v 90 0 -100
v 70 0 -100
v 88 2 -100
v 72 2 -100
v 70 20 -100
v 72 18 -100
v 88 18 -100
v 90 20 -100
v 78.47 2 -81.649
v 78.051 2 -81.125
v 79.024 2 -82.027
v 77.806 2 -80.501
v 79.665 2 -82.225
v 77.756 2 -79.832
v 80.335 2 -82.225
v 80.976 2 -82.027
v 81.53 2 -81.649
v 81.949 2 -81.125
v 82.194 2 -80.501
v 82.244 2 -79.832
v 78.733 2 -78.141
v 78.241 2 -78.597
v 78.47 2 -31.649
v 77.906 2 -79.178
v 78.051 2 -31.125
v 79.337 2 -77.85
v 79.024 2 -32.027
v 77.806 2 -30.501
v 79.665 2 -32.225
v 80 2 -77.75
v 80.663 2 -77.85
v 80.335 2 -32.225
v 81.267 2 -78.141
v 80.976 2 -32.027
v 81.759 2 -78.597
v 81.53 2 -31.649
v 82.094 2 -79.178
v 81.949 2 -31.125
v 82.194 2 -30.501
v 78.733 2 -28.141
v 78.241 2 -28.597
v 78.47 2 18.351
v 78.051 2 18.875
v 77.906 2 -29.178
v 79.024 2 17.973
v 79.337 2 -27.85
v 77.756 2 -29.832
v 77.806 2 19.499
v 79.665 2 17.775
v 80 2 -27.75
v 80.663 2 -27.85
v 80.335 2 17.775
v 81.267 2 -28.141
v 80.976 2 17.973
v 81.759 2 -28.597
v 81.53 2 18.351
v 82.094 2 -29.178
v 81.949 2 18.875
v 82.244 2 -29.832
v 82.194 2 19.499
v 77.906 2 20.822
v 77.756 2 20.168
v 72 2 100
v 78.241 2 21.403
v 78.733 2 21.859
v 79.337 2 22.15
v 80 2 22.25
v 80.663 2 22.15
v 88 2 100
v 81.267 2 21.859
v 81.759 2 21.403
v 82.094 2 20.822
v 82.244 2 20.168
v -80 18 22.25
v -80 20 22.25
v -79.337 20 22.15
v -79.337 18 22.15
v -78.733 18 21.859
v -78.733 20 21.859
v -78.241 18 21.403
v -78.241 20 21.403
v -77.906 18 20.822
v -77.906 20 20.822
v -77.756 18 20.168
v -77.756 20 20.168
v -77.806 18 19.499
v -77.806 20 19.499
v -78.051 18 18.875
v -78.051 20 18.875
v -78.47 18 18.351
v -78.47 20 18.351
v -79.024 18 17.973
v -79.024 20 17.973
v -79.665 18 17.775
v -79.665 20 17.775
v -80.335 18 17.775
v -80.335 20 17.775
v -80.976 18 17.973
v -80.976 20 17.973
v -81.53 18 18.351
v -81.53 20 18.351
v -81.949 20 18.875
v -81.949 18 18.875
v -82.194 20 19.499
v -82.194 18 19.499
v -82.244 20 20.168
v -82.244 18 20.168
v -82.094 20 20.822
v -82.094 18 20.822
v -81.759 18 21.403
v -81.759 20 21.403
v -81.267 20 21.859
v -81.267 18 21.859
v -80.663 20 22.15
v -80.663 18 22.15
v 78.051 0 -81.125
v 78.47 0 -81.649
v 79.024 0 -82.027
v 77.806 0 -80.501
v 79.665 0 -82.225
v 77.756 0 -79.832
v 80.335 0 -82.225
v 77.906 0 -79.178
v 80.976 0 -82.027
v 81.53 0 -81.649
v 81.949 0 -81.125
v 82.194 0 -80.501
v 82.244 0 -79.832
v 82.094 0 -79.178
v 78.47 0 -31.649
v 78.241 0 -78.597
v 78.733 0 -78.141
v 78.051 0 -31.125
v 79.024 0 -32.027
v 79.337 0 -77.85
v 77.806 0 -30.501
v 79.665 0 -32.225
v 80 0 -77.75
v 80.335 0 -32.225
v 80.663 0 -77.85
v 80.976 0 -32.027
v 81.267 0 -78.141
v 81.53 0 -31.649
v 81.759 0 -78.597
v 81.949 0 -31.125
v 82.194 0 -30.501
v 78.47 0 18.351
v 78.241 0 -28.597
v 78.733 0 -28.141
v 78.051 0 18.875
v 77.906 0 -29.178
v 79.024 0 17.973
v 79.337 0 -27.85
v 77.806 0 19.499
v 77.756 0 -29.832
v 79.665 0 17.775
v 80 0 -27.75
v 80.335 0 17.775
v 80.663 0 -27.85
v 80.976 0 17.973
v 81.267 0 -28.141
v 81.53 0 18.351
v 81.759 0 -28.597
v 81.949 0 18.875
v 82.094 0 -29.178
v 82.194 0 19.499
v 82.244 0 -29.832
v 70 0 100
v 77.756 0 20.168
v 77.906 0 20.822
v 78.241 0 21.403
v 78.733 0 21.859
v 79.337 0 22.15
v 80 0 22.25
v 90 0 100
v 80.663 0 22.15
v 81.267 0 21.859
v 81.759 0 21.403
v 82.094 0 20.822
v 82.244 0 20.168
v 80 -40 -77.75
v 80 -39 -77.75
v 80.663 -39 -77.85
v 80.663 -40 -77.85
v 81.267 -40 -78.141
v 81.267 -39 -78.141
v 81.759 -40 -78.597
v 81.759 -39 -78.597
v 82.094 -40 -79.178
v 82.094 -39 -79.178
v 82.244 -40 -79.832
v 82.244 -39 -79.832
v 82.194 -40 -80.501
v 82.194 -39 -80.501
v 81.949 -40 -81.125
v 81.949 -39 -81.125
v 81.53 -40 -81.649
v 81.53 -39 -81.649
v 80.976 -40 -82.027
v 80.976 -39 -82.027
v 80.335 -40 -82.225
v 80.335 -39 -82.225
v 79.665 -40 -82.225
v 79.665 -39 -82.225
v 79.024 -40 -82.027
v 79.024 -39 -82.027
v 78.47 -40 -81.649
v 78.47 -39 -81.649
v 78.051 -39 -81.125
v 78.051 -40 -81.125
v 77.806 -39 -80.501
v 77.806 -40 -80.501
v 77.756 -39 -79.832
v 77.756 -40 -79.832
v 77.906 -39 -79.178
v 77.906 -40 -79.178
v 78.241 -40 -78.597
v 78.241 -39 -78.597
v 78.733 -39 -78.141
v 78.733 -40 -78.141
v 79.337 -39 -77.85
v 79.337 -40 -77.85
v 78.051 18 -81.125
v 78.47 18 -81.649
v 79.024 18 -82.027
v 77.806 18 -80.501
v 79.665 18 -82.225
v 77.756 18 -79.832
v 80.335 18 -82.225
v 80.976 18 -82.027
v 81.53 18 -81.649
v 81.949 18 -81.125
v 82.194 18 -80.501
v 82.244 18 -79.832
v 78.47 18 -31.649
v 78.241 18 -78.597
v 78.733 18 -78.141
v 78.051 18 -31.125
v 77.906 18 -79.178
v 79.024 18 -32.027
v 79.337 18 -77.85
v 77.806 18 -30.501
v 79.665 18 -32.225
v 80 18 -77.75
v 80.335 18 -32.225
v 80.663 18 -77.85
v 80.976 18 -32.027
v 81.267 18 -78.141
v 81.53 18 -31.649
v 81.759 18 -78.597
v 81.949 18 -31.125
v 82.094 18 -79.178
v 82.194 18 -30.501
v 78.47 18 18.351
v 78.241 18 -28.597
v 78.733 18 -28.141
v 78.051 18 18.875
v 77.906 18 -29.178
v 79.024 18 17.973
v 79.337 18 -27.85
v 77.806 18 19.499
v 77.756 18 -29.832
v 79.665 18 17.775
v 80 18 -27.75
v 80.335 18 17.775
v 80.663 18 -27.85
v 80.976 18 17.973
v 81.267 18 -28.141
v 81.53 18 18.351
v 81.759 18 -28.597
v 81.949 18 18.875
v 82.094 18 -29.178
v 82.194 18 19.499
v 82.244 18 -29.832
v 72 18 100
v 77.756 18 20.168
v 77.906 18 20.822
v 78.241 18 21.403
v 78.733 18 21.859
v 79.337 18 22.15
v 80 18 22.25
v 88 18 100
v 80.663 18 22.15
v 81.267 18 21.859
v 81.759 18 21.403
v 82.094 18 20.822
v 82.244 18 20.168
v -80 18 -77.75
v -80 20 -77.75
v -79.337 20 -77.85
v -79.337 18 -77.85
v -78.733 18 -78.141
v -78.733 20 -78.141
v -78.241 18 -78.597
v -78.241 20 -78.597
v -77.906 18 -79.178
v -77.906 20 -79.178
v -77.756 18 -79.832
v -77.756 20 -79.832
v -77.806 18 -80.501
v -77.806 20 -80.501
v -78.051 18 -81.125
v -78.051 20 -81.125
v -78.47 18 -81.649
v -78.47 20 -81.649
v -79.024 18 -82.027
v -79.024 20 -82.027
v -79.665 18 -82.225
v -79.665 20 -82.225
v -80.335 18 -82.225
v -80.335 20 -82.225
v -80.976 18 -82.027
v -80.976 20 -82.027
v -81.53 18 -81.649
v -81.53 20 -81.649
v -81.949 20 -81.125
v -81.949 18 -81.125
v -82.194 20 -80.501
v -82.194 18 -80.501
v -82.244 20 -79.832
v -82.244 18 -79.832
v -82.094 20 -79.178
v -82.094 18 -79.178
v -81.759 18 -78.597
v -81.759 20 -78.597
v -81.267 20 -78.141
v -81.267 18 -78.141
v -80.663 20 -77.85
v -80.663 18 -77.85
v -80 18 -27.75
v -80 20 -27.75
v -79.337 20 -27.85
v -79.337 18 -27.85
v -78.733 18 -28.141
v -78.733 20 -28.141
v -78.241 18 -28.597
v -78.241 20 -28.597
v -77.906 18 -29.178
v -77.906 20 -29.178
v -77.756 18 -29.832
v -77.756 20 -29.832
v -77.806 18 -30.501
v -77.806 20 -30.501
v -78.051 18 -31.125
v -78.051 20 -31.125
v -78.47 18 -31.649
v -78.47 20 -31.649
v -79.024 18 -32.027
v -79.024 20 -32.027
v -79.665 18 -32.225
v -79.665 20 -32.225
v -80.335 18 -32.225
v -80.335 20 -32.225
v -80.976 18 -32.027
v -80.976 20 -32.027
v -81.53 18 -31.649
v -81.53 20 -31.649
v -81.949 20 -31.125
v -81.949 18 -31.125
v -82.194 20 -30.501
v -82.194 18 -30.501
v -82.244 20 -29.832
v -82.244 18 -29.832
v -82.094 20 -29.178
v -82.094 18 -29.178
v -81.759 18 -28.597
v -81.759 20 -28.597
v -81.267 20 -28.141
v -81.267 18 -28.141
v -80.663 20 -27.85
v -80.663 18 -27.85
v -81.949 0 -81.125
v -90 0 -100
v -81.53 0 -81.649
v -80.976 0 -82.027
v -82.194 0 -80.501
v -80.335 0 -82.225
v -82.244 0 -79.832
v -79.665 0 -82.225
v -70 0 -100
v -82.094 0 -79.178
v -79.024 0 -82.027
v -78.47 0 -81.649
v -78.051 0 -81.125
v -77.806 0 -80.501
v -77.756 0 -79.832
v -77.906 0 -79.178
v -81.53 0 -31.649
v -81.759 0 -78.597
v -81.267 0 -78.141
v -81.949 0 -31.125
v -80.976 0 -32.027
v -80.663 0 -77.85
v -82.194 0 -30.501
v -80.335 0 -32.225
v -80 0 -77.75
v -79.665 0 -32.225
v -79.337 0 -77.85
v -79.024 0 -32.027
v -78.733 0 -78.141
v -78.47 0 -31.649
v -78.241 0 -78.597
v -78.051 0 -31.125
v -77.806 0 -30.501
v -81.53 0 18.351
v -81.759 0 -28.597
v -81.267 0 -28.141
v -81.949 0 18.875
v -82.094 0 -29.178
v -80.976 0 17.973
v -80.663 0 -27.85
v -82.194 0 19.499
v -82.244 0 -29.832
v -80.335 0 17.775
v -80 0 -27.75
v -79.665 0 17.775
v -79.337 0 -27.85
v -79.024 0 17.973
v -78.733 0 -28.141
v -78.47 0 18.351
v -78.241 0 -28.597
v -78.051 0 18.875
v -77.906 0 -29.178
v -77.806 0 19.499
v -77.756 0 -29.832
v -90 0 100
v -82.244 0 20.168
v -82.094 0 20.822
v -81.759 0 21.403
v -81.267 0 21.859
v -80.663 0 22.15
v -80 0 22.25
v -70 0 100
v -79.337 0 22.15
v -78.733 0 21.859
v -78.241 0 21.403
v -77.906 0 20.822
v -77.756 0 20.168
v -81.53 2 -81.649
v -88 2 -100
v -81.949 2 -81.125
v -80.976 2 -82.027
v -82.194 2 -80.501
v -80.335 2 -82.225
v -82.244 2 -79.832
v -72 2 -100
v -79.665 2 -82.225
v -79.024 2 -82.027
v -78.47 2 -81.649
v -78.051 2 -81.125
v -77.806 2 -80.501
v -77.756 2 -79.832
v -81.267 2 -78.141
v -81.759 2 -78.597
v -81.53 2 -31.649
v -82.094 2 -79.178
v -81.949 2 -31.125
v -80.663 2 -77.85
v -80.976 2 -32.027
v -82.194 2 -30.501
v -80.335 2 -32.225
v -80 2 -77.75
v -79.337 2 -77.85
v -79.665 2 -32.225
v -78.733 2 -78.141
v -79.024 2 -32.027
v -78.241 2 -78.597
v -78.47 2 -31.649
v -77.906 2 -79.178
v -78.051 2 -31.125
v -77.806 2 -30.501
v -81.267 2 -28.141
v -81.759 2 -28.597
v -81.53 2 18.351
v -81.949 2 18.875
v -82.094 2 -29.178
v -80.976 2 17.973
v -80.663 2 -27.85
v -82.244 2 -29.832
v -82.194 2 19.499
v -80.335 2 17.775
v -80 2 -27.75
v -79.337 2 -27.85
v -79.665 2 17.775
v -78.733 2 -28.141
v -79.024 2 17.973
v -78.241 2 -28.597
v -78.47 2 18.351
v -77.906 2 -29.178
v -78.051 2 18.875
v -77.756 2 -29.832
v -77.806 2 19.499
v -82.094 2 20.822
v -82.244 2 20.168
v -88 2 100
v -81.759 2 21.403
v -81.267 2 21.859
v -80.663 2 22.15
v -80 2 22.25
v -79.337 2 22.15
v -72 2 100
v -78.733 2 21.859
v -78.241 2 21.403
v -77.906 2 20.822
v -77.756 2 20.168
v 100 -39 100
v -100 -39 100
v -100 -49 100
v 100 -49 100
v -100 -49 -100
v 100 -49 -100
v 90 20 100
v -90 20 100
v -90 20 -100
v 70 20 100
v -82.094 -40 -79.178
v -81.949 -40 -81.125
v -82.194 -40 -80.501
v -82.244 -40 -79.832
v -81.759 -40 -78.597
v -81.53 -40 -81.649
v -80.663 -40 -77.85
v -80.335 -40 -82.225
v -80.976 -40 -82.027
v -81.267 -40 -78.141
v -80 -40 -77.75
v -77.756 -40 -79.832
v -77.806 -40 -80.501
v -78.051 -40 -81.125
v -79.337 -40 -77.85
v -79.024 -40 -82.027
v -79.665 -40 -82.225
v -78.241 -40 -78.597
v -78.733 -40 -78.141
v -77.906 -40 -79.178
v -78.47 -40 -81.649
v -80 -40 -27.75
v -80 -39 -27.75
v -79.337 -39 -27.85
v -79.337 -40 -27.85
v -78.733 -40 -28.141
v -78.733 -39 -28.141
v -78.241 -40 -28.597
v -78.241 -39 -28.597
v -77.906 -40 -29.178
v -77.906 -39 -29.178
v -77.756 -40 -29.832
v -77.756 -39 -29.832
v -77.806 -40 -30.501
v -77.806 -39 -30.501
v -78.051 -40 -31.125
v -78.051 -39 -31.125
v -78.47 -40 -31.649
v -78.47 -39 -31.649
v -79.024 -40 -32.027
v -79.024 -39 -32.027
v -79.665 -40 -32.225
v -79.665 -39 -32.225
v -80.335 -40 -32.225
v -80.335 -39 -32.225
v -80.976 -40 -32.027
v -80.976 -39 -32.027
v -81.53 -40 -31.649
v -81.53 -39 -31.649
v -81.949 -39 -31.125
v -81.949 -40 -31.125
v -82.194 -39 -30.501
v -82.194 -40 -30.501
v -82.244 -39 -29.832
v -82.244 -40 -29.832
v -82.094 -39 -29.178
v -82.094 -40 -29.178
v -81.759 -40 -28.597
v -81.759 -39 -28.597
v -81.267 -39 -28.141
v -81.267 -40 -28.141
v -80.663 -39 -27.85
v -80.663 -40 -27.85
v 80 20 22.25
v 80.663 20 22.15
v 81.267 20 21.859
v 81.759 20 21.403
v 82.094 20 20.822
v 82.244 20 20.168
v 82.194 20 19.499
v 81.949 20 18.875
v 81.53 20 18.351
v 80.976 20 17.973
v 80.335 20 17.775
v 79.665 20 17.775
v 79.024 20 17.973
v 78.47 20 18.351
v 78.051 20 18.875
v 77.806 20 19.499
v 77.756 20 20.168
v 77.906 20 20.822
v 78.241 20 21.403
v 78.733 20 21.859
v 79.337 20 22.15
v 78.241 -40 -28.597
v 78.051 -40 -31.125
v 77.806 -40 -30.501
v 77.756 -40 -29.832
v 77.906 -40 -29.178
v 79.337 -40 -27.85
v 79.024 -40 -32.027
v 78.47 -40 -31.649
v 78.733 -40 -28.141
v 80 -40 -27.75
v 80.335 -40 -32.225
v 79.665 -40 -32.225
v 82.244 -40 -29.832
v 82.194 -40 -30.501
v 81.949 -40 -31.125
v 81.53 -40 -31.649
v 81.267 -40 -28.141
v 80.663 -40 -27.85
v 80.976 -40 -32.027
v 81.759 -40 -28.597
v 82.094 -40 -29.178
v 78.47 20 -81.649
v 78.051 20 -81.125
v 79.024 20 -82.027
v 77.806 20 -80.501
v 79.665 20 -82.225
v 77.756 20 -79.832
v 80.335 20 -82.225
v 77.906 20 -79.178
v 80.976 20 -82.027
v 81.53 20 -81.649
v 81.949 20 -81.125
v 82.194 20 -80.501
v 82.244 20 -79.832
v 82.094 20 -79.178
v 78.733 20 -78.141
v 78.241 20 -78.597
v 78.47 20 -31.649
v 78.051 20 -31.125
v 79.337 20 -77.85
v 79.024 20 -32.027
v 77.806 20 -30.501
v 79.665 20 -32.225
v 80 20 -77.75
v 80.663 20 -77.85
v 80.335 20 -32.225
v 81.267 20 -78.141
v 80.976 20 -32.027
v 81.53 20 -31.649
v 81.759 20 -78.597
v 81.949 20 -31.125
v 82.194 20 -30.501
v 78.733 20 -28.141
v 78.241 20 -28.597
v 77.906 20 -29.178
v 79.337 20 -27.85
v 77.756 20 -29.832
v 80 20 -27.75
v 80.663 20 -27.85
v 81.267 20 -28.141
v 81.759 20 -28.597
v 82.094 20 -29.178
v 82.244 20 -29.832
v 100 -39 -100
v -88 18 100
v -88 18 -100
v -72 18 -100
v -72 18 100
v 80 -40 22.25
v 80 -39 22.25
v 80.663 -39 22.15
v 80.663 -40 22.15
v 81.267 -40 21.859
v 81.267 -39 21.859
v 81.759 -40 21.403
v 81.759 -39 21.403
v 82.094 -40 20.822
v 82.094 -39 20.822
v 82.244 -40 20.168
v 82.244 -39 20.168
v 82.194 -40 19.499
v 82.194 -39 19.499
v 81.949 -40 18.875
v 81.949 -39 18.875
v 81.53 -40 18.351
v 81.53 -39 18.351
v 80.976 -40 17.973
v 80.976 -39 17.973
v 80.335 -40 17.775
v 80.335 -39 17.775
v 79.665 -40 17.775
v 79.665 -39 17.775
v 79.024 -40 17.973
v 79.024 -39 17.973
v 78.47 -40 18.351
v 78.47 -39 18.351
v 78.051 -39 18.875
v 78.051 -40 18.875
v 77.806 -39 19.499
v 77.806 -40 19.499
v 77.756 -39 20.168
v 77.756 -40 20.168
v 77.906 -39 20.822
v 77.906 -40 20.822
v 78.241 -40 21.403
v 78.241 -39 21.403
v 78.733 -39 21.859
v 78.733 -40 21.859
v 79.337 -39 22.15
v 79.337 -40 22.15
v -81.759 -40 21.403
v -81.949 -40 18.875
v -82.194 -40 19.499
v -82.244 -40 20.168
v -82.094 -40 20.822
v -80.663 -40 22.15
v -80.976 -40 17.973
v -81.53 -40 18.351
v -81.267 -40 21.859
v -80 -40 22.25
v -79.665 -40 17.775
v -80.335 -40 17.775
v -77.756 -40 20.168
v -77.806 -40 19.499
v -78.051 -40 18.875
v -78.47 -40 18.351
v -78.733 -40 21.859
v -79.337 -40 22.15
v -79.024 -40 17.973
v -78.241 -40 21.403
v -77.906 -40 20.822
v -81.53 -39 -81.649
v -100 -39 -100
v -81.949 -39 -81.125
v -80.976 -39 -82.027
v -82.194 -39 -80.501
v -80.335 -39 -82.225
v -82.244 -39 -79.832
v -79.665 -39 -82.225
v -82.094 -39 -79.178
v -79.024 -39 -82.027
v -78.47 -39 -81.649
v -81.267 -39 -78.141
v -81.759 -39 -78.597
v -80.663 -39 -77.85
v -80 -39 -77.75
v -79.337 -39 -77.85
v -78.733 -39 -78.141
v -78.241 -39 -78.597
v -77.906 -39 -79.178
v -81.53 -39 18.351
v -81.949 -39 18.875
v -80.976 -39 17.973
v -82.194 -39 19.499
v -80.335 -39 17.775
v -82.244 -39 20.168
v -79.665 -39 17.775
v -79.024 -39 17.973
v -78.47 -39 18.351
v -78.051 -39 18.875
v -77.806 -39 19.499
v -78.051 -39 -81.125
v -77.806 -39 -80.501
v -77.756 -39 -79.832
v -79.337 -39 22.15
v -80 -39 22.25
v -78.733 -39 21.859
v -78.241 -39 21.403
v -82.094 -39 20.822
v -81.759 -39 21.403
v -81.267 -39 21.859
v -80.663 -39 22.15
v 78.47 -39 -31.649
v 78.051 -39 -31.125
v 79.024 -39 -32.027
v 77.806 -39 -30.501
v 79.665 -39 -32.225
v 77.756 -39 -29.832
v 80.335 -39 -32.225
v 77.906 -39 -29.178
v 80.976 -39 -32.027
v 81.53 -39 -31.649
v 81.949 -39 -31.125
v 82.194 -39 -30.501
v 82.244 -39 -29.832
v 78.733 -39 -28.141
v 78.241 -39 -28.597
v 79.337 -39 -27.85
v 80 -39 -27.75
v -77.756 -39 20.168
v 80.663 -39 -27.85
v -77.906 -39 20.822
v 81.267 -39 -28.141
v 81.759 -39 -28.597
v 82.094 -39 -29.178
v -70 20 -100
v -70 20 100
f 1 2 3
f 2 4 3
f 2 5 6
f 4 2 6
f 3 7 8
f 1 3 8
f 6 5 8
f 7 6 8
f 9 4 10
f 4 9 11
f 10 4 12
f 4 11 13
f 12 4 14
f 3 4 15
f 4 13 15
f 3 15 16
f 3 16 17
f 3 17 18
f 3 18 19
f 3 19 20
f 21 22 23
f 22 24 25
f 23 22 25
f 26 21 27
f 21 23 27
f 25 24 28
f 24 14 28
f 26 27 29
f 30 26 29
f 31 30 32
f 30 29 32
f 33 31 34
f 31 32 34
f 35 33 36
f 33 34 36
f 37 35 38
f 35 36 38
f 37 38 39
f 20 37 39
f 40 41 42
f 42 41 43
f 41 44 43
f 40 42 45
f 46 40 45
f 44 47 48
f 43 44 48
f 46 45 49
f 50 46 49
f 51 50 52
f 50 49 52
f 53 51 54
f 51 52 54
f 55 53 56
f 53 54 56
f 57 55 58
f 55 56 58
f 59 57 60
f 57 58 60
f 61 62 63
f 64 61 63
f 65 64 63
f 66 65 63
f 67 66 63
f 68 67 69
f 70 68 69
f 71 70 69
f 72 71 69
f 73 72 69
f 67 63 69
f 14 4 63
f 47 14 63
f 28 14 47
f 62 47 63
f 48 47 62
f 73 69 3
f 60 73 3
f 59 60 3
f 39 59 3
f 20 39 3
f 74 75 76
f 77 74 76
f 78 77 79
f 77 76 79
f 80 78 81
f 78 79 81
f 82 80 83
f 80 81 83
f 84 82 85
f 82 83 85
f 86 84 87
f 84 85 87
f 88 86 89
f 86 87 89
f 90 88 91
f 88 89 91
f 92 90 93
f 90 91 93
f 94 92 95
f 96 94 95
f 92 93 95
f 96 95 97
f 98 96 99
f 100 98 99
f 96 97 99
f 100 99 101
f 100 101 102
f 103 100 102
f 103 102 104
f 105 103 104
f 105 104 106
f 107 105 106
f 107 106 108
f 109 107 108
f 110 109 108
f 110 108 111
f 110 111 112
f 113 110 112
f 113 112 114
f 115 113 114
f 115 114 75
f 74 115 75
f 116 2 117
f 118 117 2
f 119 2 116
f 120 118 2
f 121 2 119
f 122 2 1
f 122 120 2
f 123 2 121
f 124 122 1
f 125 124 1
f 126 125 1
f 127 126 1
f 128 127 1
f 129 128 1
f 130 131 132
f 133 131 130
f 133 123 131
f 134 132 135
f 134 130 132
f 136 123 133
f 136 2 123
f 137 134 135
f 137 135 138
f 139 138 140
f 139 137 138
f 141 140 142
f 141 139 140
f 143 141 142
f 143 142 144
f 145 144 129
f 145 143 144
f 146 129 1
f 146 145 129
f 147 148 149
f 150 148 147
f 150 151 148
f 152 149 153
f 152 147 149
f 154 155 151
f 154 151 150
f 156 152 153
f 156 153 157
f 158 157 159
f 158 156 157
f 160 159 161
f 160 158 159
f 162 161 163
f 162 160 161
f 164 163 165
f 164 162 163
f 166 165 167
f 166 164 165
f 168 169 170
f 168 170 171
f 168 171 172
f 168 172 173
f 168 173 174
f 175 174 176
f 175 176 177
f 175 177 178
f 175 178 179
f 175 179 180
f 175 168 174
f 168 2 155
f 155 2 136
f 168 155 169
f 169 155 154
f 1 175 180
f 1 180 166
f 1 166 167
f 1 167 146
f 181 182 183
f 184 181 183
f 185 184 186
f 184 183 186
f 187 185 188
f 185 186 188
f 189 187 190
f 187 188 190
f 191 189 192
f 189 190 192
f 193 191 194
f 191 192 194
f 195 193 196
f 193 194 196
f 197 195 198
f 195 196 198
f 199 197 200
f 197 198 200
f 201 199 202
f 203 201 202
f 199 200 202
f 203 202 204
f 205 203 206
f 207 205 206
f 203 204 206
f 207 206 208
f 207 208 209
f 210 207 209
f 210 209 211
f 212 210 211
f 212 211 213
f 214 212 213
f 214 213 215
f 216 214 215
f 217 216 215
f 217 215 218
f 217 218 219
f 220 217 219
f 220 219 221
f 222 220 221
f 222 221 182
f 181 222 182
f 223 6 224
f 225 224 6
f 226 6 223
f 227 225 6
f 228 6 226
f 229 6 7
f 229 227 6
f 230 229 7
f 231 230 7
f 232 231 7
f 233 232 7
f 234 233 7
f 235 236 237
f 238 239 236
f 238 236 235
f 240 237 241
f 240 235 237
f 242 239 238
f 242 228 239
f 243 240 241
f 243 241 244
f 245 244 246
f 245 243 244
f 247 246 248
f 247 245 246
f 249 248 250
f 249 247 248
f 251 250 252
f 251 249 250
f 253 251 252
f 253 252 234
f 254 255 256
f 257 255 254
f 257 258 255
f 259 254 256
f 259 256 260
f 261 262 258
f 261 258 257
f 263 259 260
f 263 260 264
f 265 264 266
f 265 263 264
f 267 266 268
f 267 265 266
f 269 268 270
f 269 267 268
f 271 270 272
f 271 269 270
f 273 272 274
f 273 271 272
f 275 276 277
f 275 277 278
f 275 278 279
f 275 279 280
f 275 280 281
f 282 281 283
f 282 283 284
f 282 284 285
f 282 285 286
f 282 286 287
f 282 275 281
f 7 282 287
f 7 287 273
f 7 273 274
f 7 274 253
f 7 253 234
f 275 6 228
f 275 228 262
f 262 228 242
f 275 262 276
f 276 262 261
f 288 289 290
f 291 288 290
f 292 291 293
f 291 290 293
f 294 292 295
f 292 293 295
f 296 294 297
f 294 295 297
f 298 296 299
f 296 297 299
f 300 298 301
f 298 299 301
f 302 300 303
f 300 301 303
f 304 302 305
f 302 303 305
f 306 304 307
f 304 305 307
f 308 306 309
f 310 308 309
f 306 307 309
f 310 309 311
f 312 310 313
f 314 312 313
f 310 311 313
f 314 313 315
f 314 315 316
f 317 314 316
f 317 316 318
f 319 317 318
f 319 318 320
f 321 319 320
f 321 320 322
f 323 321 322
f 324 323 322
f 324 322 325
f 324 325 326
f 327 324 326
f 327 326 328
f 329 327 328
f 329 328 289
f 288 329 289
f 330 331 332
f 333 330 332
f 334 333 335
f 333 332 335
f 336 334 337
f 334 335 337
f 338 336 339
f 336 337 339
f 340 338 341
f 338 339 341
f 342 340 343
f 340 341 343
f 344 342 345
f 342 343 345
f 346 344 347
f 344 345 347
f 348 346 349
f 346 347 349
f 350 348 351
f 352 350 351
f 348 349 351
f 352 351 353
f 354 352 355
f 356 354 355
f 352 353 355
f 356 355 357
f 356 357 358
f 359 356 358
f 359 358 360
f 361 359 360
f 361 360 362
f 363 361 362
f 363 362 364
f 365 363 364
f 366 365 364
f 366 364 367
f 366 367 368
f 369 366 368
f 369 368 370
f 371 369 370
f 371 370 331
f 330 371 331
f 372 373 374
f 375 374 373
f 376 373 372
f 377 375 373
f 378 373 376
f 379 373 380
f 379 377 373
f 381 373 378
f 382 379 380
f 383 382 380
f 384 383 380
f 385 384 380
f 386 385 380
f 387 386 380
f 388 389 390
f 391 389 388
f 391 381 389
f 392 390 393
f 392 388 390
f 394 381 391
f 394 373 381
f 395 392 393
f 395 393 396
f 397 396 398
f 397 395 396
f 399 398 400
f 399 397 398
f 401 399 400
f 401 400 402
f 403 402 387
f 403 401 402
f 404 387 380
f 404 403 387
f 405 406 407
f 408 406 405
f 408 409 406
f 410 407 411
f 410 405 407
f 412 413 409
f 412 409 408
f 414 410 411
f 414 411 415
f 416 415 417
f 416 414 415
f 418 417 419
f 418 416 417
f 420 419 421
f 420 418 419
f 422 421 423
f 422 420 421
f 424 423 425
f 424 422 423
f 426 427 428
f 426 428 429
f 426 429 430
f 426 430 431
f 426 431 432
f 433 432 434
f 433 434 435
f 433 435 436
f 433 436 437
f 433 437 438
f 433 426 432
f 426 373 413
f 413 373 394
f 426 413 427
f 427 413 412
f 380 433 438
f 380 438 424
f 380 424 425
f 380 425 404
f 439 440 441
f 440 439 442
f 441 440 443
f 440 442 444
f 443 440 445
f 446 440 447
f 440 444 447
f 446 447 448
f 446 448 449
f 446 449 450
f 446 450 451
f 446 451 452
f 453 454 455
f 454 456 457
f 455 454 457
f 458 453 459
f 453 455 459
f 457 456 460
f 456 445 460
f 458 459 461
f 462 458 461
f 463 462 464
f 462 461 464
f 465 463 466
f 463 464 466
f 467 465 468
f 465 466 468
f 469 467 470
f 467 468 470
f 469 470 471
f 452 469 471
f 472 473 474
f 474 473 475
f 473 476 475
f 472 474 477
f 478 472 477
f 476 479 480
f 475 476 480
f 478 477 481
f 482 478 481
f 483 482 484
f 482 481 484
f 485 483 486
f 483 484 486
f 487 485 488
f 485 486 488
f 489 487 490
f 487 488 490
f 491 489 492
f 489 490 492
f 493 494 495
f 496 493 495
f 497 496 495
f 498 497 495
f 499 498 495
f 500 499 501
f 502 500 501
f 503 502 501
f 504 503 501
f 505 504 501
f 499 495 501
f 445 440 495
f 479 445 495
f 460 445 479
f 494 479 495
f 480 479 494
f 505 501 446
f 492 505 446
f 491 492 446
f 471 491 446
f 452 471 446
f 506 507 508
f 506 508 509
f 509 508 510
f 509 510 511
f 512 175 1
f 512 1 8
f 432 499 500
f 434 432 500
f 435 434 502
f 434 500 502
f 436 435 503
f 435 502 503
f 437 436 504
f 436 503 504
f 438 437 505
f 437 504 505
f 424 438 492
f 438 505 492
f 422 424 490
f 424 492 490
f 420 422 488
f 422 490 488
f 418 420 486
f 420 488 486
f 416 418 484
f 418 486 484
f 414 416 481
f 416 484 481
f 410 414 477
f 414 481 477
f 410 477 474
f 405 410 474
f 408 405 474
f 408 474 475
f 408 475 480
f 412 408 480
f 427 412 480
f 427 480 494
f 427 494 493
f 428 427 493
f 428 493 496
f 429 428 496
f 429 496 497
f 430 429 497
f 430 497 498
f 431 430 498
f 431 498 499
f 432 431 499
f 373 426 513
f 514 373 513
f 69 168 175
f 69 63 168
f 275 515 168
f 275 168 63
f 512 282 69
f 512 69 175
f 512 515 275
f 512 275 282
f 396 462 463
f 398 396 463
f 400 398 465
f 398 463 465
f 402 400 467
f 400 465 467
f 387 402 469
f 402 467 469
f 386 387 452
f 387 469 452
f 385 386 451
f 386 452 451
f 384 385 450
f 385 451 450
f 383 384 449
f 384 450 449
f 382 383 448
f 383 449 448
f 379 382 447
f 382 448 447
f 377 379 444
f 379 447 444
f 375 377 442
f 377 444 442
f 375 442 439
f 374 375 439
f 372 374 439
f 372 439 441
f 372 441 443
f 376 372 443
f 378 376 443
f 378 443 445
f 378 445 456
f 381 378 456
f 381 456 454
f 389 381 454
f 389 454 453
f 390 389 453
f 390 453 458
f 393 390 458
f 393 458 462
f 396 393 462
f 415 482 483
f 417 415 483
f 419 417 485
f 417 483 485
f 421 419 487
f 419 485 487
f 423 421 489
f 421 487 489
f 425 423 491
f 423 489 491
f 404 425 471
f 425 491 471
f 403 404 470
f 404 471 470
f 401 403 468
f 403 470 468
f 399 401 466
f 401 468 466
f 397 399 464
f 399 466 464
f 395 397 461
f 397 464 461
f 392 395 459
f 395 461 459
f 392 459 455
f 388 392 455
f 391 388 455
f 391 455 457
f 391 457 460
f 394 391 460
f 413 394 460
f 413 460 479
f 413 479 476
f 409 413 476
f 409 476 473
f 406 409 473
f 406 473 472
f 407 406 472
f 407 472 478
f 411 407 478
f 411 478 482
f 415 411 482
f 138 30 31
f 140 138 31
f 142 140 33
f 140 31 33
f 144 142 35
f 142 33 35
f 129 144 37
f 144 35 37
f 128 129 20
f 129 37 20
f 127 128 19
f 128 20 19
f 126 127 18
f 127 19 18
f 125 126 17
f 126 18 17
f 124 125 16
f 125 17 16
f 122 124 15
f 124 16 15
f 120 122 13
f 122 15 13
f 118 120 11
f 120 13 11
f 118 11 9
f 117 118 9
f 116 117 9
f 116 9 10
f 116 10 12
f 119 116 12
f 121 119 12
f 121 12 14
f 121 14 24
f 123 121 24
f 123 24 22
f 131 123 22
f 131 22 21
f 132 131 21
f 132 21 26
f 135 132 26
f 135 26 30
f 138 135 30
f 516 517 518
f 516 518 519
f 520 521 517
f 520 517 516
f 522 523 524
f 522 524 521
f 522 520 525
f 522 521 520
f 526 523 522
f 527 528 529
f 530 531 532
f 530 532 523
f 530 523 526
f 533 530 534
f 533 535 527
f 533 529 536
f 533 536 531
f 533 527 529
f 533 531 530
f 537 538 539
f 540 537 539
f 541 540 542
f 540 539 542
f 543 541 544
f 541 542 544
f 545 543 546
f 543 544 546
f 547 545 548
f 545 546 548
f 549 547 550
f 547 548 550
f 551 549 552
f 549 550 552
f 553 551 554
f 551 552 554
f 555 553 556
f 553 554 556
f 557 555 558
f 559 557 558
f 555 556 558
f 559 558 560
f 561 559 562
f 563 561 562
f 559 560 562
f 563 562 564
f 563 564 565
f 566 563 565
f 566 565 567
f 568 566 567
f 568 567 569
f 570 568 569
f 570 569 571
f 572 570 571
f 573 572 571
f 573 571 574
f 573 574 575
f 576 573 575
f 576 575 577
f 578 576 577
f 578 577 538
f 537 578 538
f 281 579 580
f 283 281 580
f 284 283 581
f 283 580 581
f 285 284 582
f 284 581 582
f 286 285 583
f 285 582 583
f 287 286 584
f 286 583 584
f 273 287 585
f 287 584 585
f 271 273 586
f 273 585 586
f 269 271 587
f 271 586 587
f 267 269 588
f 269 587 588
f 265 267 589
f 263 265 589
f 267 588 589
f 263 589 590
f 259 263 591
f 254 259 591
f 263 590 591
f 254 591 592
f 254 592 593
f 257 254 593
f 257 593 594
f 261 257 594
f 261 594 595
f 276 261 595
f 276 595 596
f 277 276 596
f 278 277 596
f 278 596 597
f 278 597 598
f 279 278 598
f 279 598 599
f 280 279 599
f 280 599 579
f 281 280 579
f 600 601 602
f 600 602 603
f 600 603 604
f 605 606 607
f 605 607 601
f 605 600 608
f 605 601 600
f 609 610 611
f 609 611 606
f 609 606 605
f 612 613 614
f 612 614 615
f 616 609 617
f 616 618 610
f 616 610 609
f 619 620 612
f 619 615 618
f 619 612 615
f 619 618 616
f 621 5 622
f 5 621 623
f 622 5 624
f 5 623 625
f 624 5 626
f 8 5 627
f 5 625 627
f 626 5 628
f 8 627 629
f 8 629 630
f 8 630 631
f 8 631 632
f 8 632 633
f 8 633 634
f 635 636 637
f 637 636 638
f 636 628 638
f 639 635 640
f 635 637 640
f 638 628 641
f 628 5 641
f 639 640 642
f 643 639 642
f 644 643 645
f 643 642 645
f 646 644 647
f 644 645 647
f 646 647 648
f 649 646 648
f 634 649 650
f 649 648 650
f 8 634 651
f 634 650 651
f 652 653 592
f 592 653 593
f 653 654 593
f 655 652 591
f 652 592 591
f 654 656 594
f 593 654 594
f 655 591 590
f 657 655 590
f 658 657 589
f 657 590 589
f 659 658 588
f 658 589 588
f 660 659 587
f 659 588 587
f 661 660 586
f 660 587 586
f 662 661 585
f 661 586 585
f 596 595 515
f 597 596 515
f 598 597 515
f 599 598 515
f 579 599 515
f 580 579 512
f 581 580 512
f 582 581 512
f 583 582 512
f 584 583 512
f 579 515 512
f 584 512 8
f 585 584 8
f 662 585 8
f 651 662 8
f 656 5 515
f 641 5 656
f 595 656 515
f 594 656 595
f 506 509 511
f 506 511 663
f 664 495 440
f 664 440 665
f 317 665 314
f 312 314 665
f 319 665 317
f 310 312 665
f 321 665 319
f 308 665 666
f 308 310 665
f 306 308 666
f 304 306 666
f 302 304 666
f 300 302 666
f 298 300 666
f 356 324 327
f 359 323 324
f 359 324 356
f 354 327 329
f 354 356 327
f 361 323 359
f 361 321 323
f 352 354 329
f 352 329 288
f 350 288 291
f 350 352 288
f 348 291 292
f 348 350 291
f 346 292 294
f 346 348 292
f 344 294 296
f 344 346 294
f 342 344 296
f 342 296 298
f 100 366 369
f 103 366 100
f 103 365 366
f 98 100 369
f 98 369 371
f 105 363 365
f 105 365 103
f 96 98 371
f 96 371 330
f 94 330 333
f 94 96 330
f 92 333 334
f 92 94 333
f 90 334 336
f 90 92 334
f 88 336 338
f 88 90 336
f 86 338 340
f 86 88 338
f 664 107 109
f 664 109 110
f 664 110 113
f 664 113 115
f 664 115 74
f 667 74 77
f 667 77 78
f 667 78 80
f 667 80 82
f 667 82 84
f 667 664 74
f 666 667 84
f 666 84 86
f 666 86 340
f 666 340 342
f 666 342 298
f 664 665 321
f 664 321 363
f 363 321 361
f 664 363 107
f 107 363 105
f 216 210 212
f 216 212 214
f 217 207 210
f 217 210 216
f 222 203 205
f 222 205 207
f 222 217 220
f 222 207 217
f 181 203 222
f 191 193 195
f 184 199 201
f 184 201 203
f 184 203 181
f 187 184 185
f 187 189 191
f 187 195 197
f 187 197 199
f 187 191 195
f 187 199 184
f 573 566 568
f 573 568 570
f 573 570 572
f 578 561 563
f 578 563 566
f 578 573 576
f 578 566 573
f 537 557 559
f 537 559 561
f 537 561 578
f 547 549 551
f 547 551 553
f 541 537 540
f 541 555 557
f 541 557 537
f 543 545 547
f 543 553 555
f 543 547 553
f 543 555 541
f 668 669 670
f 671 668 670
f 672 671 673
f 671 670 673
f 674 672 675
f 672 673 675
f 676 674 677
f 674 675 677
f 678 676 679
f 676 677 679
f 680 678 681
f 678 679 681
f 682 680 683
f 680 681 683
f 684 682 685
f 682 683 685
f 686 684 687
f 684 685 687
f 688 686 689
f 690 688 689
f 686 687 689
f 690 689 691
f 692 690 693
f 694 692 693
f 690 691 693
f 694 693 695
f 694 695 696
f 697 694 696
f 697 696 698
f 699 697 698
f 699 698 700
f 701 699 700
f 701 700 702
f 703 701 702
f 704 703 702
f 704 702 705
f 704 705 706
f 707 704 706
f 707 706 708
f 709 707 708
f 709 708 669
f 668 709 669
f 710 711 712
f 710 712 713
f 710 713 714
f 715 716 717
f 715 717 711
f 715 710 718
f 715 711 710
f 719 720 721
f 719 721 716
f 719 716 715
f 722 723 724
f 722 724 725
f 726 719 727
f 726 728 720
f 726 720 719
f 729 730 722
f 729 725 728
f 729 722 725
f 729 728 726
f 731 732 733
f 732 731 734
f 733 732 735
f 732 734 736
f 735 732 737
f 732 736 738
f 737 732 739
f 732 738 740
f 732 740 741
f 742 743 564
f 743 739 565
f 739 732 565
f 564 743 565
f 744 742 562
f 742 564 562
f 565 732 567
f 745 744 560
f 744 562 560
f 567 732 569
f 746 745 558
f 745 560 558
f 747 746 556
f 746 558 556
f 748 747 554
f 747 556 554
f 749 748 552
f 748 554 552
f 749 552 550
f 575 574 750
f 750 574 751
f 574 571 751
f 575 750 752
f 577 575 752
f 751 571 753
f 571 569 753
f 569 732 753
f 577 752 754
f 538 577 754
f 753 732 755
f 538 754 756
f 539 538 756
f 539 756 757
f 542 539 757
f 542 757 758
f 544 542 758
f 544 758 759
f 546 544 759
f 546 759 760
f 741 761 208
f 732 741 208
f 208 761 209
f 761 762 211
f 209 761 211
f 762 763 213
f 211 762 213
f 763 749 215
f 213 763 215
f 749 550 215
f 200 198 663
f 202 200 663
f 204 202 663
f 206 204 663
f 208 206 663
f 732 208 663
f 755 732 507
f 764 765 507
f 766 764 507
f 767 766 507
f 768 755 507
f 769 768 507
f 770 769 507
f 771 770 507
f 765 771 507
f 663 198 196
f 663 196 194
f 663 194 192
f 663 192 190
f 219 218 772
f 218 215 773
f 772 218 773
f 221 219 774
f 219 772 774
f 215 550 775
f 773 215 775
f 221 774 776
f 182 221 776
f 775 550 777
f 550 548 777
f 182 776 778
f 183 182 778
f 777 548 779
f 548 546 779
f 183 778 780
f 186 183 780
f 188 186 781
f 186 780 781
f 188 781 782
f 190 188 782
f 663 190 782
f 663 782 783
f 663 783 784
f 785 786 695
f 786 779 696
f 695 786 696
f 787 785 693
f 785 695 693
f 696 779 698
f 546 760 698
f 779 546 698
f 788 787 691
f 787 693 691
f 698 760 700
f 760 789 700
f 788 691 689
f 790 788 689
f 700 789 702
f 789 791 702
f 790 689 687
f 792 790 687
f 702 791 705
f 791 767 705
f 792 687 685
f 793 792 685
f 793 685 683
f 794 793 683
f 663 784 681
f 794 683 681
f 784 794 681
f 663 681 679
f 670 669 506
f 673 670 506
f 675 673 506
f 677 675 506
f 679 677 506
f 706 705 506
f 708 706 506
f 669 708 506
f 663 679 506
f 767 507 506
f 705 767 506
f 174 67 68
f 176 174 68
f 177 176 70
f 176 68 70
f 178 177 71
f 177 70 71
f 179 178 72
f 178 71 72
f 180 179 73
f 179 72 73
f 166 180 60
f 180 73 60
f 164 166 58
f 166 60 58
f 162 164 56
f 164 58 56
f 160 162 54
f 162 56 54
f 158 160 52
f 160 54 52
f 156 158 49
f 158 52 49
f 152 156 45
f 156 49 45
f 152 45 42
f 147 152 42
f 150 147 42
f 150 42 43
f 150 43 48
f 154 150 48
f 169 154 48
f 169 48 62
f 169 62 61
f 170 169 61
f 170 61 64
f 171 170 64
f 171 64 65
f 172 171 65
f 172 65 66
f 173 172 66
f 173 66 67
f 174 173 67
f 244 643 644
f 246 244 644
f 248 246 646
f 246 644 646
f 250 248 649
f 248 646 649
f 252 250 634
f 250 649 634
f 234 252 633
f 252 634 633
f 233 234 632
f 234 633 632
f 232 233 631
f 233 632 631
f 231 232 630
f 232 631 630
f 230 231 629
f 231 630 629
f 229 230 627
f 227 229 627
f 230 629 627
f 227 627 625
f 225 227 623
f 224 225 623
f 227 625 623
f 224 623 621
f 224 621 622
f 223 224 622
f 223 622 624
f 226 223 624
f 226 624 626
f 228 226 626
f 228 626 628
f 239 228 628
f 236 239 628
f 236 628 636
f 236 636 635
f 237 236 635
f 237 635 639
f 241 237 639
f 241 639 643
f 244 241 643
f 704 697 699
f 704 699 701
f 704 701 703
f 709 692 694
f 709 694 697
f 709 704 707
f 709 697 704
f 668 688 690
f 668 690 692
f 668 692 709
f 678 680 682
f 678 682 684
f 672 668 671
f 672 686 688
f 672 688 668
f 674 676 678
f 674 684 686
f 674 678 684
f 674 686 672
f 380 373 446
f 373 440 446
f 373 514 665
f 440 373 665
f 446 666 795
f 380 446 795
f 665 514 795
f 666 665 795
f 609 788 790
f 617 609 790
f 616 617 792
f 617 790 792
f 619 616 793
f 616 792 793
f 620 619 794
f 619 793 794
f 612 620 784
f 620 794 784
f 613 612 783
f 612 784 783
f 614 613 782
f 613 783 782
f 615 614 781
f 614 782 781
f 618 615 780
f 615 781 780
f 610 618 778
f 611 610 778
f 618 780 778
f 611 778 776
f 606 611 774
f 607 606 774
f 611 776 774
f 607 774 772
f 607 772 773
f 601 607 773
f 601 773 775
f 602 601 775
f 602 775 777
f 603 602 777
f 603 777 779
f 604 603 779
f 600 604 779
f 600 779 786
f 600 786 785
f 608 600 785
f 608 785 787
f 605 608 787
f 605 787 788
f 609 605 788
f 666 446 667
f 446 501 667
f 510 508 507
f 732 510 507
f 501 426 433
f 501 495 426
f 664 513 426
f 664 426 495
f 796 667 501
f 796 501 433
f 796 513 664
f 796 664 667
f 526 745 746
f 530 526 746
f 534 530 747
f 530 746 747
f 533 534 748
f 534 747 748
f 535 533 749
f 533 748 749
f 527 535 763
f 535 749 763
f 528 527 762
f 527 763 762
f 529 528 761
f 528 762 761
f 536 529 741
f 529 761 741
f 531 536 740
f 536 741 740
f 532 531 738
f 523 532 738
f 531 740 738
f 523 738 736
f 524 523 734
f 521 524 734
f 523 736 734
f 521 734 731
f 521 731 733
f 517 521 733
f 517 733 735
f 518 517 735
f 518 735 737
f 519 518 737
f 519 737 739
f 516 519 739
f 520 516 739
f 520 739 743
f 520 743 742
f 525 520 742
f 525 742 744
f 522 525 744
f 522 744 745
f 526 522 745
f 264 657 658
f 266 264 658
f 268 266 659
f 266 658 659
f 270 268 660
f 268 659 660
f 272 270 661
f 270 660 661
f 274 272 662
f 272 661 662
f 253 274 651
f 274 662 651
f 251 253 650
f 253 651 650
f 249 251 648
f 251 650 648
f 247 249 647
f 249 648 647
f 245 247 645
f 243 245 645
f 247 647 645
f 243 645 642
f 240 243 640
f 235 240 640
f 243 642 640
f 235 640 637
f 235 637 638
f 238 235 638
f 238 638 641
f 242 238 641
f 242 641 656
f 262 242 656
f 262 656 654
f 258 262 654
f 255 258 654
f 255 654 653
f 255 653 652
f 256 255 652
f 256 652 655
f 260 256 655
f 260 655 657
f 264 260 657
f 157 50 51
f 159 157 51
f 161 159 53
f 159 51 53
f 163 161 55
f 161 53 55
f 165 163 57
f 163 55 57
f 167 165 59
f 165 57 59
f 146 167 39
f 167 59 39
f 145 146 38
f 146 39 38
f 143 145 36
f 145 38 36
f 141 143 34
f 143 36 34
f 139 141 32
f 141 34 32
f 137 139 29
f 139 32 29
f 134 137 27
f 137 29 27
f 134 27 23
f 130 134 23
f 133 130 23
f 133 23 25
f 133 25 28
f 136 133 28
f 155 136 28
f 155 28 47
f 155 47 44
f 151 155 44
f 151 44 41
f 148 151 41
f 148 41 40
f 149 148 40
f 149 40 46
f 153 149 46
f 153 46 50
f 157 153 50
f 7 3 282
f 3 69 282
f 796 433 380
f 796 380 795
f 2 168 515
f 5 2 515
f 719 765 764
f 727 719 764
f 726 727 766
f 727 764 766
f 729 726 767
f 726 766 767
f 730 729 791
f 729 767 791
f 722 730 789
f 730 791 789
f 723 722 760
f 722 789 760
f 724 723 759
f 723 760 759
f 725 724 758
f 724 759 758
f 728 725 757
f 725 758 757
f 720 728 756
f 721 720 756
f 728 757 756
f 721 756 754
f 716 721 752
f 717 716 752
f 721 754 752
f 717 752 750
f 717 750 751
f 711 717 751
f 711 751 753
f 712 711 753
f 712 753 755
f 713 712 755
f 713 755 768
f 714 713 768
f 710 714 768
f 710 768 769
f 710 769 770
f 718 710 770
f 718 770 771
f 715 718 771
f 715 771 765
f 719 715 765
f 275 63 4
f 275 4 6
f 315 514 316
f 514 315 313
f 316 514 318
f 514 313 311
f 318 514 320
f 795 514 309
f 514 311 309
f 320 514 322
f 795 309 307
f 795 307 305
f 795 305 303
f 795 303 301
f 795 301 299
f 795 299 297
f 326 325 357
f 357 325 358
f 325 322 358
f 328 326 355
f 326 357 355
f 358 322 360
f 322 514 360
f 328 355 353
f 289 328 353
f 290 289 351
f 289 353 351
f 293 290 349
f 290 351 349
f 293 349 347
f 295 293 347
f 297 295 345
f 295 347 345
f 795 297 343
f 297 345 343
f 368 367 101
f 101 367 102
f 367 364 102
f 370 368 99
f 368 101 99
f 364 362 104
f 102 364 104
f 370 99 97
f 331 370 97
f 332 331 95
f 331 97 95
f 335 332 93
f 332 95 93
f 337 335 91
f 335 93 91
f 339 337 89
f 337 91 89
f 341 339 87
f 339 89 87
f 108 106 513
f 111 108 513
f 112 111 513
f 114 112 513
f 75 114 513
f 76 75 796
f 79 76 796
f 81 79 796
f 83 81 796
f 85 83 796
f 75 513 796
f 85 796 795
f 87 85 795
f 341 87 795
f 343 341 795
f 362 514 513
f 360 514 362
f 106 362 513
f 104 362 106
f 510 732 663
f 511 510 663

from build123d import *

# Parameters (mm, degrees)
SKETCH_1_W          = 200
SKETCH_1_H          = 10
EXTRUDE_1_DEPTH     = 100
SKETCH_1_W_2        = 20
SKETCH_1_H_2        = 20
SKETCH_1_W_3        = 16
SKETCH_1_H_3        = 16
EXTRUDE_1_2_DEPTH   = 100
EXTRUDE_1_3_DEPTH   = 100
SKETCH_2_R          = 2.25
CUT_EXTRUDE_1_DEPTH = 20
SKETCH_3_R          = 2.25
CUT_EXTRUDE_6_DEPTH = 60


with BuildPart() as part:
    # 草图1 → 凸台-拉伸1 (new, symmetric)
    with BuildSketch(Plane.XY):
        with Locations((0, -44)):
            Rectangle(SKETCH_1_W, SKETCH_1_H)
    extrude(amount=EXTRUDE_1_DEPTH, both=True)

    # 草图3 → 切除-拉伸6 (cut)
    with BuildSketch(Plane(origin=(0, 20, 0), x_dir=(1, 0, 0), z_dir=(0, 1, 0))):
        with Locations(Location((80, -20, 0), (0, 0, 270))):
            Circle(SKETCH_3_R)
        with Locations(Location((80, 30, 0), (0, 0, 270))):
            Circle(SKETCH_3_R)
        with Locations(Location((80, 80, 0), (0, 0, 270))):
            Circle(SKETCH_3_R)
        with Locations(Location((-80, -20, 0), (0, 0, 270))):
            Circle(SKETCH_3_R)
        with Locations(Location((-80, 30, 0), (0, 0, 270))):
            Circle(SKETCH_3_R)
        with Locations(Location((-80, 80, 0), (0, 0, 270))):
            Circle(SKETCH_3_R)
    extrude(amount=-CUT_EXTRUDE_6_DEPTH, mode=Mode.SUBTRACT)


with BuildPart() as body_2:
    # 草图1 → Extrude 1 2 (new, symmetric)
    with BuildSketch(Plane.XY):
        with Locations((-80, 10)):
            Rectangle(SKETCH_1_W_2, SKETCH_1_H_2)
        with Locations((-80, 10)):
            Rectangle(SKETCH_1_W_3, SKETCH_1_H_3, mode=Mode.SUBTRACT)
    extrude(amount=EXTRUDE_1_2_DEPTH, both=True)


with BuildPart() as body_3:
    # 草图1 → Extrude 1 3 (new, symmetric)
    with BuildSketch(Plane.XY):
        with Locations((80, 10)):
            Rectangle(SKETCH_1_W_2, SKETCH_1_H_2)
        with Locations((80, 10)):
            Rectangle(SKETCH_1_W_3, SKETCH_1_H_3, mode=Mode.SUBTRACT)
    extrude(amount=EXTRUDE_1_3_DEPTH, both=True)


with BuildPart() as cut_extrude_1_tool:
    # 草图2 → 切除-拉伸1 (new body)
    with BuildSketch(Plane(origin=(0, 20, 0), x_dir=(1, 0, 0), z_dir=(0, 1, 0))):
        with Locations(Location((80, 80, 0), (0, 0, 270))):
            Circle(SKETCH_2_R)
        with Locations(Location((80, 30, 0), (0, 0, 270))):
            Circle(SKETCH_2_R)
        with Locations(Location((80, -20, 0), (0, 0, 270))):
            Circle(SKETCH_2_R)
        with Locations(Location((-80, -20, 0), (0, 0, 270))):
            Circle(SKETCH_2_R)
        with Locations(Location((-80, 30, 0), (0, 0, 270))):
            Circle(SKETCH_2_R)
        with Locations(Location((-80, 80, 0), (0, 0, 270))):
            Circle(SKETCH_2_R)
    extrude(amount=-CUT_EXTRUDE_1_DEPTH)


with BuildPart() as body_2_1:
    add(body_2.part)

    # 切除-拉伸1: cut by cut_extrude_1_tool
    add(cut_extrude_1_tool.part, mode=Mode.SUBTRACT)


with BuildPart() as body_3_1:
    add(body_3.part)

    # 切除-拉伸1: cut by cut_extrude_1_tool
    add(cut_extrude_1_tool.part, mode=Mode.SUBTRACT)


solid = Compound([part.part, body_2_1.part, body_3_1.part])
